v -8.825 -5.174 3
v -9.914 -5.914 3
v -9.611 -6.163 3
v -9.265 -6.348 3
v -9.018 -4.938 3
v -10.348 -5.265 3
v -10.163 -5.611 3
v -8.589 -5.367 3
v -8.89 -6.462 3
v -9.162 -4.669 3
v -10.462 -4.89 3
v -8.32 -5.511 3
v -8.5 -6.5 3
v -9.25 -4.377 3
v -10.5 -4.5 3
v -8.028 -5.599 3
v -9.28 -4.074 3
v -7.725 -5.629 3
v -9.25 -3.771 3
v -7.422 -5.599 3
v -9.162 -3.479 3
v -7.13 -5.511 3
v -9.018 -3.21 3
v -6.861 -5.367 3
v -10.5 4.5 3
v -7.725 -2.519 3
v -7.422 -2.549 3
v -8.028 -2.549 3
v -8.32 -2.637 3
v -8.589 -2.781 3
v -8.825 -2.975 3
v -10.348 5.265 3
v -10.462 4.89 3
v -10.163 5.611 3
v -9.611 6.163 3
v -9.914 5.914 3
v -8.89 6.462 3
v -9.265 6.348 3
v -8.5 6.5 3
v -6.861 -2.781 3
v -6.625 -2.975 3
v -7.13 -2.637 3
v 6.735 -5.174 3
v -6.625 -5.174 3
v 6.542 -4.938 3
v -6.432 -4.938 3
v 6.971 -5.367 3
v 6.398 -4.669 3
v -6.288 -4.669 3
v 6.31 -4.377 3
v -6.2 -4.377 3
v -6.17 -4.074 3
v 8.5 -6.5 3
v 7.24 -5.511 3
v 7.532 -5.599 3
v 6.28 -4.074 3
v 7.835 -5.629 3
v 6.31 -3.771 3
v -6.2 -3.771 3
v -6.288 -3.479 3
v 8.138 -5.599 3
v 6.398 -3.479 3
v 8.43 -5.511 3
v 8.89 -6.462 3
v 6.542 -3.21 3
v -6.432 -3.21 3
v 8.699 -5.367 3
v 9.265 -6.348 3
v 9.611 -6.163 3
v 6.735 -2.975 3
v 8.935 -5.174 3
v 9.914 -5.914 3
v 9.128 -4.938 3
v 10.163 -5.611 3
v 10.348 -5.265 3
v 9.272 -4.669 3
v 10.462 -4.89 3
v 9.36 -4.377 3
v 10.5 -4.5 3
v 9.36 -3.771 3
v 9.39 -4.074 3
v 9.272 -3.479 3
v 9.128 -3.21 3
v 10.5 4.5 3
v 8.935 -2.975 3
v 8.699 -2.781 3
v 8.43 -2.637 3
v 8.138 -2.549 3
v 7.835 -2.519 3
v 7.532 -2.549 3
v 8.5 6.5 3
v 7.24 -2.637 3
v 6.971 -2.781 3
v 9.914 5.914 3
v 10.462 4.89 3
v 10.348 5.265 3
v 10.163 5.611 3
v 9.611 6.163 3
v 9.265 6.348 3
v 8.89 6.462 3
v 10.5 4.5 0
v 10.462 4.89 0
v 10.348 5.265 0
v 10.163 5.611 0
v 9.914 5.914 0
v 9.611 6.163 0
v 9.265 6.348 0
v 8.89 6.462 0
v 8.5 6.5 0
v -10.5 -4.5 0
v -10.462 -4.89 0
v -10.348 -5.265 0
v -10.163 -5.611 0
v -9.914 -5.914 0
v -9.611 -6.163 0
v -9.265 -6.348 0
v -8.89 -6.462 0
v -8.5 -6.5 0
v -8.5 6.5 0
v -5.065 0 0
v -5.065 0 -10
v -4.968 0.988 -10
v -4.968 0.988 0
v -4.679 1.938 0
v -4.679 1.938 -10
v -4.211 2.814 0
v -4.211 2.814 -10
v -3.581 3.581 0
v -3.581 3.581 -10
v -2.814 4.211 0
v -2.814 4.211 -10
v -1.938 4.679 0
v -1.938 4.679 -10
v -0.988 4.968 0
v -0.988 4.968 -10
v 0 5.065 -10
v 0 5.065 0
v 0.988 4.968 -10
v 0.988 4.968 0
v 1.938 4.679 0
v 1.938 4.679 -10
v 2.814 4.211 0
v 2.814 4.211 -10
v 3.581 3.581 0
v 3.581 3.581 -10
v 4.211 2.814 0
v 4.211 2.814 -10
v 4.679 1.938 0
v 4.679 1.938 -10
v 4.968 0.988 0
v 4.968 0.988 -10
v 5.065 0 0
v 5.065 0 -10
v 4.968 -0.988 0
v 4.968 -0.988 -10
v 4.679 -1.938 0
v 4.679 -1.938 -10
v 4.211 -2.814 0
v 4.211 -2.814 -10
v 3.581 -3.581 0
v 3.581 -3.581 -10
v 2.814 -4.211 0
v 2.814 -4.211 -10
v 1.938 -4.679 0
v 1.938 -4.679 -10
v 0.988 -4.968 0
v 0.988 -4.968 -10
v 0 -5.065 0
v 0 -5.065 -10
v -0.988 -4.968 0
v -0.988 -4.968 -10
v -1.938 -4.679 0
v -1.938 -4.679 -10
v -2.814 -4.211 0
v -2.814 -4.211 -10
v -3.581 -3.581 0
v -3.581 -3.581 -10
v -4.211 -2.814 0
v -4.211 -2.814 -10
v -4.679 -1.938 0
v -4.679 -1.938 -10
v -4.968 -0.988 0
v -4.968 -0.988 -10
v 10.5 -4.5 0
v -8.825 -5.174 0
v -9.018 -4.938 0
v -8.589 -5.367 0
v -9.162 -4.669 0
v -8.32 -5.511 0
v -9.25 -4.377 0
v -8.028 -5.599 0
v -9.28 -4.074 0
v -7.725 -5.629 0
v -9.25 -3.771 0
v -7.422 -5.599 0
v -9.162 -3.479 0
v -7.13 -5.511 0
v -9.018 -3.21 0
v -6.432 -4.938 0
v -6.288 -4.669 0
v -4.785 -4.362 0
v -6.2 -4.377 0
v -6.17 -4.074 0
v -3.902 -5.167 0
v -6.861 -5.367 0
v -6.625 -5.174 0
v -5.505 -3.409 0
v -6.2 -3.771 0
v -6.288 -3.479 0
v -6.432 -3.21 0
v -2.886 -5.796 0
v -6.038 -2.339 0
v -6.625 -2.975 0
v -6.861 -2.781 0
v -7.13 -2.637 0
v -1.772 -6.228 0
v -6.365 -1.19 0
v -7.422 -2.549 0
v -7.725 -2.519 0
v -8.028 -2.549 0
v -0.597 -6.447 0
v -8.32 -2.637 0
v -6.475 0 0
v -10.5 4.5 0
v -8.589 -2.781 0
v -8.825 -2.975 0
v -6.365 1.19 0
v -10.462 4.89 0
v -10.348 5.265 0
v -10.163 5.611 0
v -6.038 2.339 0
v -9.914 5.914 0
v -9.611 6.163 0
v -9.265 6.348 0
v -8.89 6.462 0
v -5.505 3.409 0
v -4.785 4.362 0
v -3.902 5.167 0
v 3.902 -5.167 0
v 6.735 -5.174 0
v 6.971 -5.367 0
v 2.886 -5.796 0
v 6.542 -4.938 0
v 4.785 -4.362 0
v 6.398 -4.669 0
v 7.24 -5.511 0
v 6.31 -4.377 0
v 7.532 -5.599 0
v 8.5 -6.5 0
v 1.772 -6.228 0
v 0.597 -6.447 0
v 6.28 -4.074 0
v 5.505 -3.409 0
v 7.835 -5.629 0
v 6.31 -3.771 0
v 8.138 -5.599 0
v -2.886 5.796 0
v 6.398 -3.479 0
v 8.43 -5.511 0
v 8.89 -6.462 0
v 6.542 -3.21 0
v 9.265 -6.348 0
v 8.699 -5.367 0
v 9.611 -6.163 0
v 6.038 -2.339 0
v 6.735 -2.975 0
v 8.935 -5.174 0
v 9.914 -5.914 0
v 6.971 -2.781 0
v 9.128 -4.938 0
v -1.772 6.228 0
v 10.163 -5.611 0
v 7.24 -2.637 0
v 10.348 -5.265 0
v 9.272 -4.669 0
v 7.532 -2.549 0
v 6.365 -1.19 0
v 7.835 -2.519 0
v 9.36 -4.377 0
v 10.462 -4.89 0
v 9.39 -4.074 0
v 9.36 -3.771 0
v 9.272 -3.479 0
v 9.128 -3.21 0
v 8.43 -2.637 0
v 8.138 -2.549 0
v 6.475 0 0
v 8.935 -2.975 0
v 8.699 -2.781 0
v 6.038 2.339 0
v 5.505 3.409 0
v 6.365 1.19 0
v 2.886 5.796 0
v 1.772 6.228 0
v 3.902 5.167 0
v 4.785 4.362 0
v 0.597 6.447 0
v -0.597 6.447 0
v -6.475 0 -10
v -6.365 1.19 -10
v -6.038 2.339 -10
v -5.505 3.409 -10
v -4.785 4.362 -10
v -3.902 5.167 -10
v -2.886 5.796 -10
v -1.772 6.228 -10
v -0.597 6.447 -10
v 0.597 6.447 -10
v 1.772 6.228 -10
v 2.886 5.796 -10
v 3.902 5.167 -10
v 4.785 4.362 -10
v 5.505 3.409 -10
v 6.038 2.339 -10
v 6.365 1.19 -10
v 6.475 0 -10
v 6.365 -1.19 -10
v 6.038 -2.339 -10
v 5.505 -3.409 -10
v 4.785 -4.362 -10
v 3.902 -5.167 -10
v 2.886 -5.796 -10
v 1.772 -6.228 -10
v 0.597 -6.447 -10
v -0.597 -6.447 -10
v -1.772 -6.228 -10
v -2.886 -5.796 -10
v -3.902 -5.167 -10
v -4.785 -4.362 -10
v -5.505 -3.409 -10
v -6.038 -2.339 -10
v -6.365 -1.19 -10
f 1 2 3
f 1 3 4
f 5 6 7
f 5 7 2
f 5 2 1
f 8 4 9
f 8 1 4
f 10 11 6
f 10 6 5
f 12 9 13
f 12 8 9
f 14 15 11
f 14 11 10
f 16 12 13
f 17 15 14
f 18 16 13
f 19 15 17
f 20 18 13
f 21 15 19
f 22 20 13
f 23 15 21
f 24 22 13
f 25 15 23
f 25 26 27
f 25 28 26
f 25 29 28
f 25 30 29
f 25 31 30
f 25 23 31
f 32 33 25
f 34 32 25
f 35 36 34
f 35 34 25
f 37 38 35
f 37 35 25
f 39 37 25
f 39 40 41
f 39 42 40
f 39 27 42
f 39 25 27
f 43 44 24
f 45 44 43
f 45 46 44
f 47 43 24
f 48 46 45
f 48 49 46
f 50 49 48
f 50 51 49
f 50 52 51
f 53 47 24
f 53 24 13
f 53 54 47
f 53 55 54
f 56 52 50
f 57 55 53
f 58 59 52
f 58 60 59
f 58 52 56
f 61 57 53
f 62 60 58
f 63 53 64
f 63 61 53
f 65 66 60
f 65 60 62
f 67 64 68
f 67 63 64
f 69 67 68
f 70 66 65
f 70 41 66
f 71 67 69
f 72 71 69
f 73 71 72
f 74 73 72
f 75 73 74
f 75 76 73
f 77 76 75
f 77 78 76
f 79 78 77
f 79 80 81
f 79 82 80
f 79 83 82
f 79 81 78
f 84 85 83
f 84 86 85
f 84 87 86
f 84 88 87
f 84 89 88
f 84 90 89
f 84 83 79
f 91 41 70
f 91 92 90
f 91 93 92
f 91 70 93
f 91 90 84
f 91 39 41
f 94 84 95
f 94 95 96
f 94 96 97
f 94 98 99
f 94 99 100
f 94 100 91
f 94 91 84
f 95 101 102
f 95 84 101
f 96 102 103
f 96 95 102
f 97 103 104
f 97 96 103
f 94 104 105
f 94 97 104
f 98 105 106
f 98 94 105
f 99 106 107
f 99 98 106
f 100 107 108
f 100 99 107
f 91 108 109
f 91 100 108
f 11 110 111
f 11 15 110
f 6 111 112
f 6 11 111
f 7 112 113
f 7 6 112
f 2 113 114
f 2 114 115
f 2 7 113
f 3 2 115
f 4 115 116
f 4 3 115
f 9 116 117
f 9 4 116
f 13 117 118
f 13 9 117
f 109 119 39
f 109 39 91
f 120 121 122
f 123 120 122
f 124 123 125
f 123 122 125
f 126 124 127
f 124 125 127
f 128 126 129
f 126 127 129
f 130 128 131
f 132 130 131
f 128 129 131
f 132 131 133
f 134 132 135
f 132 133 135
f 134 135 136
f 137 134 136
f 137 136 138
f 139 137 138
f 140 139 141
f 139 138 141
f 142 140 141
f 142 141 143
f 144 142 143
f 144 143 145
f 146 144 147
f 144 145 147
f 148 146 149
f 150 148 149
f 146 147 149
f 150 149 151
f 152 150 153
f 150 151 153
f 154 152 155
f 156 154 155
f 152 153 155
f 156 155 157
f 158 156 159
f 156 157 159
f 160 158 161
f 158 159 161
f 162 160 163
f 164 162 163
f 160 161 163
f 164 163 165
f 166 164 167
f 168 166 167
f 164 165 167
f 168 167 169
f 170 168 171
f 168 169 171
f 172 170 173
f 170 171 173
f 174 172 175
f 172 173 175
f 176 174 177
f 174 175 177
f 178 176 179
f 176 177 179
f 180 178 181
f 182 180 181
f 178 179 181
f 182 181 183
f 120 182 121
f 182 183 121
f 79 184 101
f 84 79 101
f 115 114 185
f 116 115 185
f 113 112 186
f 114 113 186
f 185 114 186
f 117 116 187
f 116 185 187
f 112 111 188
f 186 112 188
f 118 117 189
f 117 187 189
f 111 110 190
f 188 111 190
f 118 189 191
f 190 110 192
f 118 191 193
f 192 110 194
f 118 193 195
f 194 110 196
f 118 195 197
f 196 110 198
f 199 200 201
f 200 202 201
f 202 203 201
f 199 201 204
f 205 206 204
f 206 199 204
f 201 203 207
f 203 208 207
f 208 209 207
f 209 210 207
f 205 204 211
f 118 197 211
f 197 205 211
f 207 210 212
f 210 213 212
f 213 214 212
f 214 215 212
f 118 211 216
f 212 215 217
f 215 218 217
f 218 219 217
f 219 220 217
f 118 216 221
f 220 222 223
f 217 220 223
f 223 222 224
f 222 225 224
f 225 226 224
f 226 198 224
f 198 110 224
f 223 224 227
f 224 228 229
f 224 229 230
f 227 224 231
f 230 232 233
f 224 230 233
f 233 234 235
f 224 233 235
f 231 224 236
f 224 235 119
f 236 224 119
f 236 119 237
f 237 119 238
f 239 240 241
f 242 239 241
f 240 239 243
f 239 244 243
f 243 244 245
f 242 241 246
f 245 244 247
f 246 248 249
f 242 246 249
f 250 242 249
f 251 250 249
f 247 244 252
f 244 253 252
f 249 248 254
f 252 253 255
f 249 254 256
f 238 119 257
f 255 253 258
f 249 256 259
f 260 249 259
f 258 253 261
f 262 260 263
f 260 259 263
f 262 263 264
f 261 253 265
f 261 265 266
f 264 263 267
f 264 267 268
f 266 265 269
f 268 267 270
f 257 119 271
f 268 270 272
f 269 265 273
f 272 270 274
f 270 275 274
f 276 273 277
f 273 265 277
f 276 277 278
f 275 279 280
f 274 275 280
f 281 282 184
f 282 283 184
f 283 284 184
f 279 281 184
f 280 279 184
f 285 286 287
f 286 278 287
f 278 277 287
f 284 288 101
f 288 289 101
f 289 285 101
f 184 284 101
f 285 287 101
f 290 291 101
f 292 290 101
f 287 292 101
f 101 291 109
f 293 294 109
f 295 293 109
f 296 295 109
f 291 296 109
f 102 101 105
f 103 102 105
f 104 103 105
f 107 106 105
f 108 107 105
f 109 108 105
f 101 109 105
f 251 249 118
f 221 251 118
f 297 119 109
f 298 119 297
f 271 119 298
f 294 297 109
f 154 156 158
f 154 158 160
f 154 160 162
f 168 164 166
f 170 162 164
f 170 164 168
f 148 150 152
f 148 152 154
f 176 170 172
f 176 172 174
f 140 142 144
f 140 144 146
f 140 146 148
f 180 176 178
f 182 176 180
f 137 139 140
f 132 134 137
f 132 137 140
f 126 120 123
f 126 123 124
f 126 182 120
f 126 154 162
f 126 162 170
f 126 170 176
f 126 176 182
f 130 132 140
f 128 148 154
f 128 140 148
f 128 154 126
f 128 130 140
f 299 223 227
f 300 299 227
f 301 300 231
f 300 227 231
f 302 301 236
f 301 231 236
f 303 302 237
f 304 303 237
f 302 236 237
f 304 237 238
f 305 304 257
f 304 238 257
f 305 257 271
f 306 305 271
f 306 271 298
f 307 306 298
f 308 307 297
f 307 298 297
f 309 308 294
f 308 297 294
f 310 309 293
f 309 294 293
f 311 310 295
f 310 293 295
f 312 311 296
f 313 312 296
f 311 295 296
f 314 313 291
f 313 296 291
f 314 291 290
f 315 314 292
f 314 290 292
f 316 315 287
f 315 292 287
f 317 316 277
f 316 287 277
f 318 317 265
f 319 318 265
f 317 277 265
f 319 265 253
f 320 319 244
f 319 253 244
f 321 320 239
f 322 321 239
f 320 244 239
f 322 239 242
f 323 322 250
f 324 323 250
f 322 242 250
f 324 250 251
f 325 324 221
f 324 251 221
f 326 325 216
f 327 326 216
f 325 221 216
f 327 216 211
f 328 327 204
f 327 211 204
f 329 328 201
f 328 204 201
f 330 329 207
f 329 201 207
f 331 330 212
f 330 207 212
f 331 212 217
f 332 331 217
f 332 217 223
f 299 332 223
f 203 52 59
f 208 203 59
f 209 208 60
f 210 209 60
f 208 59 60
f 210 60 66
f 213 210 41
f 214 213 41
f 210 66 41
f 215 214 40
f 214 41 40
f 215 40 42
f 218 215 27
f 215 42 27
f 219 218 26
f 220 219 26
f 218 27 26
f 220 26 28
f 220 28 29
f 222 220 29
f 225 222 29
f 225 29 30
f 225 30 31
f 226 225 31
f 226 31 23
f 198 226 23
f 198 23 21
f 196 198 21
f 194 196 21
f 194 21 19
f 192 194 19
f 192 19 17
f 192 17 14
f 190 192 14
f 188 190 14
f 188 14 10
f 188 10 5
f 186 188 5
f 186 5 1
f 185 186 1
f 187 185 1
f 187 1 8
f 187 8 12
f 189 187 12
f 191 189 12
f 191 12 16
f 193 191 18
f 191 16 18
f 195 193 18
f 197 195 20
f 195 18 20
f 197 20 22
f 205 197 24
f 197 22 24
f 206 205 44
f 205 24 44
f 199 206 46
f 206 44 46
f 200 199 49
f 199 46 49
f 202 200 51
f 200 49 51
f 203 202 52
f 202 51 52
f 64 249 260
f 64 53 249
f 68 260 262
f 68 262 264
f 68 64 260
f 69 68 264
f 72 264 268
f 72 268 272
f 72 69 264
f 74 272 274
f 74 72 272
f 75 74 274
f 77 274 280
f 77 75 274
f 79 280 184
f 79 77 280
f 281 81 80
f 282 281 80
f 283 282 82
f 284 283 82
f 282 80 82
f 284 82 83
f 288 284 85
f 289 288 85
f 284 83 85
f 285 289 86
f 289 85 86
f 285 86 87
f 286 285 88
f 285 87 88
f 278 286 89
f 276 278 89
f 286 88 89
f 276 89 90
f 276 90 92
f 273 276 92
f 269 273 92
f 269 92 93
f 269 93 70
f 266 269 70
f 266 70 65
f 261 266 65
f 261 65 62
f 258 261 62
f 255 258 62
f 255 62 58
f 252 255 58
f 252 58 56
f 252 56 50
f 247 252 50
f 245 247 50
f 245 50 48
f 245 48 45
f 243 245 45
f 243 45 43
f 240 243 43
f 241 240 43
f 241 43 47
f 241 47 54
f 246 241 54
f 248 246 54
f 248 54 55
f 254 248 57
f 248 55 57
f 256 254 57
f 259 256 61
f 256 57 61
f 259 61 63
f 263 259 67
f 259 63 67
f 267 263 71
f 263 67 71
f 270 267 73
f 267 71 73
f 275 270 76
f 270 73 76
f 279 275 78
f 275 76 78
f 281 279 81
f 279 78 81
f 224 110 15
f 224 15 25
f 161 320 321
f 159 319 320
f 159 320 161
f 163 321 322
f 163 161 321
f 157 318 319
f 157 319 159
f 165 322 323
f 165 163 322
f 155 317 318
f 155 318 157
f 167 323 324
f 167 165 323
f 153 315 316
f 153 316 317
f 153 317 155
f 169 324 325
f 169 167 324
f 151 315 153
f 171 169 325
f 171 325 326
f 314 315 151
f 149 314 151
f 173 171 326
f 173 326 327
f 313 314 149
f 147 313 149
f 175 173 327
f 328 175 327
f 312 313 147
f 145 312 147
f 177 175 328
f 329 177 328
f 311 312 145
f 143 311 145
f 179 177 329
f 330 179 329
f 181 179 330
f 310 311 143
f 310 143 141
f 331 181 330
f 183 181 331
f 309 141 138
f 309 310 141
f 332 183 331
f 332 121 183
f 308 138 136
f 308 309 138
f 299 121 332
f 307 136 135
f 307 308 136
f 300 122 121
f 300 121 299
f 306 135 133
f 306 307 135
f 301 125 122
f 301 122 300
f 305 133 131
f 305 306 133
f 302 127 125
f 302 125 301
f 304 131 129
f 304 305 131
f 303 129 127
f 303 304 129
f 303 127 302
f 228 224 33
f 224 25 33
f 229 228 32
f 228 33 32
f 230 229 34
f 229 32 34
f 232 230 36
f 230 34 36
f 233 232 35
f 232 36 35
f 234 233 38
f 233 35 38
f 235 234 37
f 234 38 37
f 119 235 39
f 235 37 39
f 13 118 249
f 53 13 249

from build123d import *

# Parameters (mm, degrees)
ESQUISSE1_W             = 21
ESQUISSE1_H             = 13
BOSS_EXTRU_1_DEPTH      = 3
CONG_1_R                = 2
ESQUISSE2_R             = 1.555
ENL_V_MAT_EXTRU_1_DEPTH = 4
ESQUISSE3_R             = 6.475
BOSS_EXTRU_2_DEPTH      = 10
ESQUISSE4_R             = 5.065
ENL_V_MAT_EXTRU_2_DEPTH = 10


with BuildPart() as part:
    # Esquisse1 → Boss.-Extru.1 (new body)
    with BuildSketch(Plane.XY):
        Rectangle(ESQUISSE1_W, ESQUISSE1_H)
    extrude(amount=BOSS_EXTRU_1_DEPTH)

    # Congé1
    cong_1_edges = [part.edges().sort_by_distance(p)[0] for p in [
        (-10.5, 6.5, 1.5),
        (10.5, 6.5, 1.5),
        (10.5, -6.5, 1.5),
        (-10.5, -6.5, 1.5),
    ]]
    fillet(cong_1_edges, radius=CONG_1_R)

    # Esquisse2 → Enlèv. mat.-Extru.1 (cut, through all)
    with BuildSketch(Plane.XY.offset(3)):
        with Locations((-7.725, -4.074069474)):
            Circle(ESQUISSE2_R)
        with Locations((7.835, -4.074069474)):
            Circle(ESQUISSE2_R)
    extrude(amount=-ENL_V_MAT_EXTRU_1_DEPTH, mode=Mode.SUBTRACT)

    # Esquisse3 → Boss.-Extru.2 (add)
    with BuildSketch(Plane(origin=(0, 0, 0), x_dir=(-1, 0, 0), z_dir=(0, 0, -1))):
        Circle(ESQUISSE3_R)
    extrude(amount=BOSS_EXTRU_2_DEPTH)

    # Esquisse4 → Enlèv. mat.-Extru.2 (cut)
    with BuildSketch(Plane(origin=(0, 0, -10), x_dir=(-1, 0, 0), z_dir=(0, 0, -1))):
        Circle(ESQUISSE4_R)
    extrude(amount=-ENL_V_MAT_EXTRU_2_DEPTH, mode=Mode.SUBTRACT)


solid = part.part
